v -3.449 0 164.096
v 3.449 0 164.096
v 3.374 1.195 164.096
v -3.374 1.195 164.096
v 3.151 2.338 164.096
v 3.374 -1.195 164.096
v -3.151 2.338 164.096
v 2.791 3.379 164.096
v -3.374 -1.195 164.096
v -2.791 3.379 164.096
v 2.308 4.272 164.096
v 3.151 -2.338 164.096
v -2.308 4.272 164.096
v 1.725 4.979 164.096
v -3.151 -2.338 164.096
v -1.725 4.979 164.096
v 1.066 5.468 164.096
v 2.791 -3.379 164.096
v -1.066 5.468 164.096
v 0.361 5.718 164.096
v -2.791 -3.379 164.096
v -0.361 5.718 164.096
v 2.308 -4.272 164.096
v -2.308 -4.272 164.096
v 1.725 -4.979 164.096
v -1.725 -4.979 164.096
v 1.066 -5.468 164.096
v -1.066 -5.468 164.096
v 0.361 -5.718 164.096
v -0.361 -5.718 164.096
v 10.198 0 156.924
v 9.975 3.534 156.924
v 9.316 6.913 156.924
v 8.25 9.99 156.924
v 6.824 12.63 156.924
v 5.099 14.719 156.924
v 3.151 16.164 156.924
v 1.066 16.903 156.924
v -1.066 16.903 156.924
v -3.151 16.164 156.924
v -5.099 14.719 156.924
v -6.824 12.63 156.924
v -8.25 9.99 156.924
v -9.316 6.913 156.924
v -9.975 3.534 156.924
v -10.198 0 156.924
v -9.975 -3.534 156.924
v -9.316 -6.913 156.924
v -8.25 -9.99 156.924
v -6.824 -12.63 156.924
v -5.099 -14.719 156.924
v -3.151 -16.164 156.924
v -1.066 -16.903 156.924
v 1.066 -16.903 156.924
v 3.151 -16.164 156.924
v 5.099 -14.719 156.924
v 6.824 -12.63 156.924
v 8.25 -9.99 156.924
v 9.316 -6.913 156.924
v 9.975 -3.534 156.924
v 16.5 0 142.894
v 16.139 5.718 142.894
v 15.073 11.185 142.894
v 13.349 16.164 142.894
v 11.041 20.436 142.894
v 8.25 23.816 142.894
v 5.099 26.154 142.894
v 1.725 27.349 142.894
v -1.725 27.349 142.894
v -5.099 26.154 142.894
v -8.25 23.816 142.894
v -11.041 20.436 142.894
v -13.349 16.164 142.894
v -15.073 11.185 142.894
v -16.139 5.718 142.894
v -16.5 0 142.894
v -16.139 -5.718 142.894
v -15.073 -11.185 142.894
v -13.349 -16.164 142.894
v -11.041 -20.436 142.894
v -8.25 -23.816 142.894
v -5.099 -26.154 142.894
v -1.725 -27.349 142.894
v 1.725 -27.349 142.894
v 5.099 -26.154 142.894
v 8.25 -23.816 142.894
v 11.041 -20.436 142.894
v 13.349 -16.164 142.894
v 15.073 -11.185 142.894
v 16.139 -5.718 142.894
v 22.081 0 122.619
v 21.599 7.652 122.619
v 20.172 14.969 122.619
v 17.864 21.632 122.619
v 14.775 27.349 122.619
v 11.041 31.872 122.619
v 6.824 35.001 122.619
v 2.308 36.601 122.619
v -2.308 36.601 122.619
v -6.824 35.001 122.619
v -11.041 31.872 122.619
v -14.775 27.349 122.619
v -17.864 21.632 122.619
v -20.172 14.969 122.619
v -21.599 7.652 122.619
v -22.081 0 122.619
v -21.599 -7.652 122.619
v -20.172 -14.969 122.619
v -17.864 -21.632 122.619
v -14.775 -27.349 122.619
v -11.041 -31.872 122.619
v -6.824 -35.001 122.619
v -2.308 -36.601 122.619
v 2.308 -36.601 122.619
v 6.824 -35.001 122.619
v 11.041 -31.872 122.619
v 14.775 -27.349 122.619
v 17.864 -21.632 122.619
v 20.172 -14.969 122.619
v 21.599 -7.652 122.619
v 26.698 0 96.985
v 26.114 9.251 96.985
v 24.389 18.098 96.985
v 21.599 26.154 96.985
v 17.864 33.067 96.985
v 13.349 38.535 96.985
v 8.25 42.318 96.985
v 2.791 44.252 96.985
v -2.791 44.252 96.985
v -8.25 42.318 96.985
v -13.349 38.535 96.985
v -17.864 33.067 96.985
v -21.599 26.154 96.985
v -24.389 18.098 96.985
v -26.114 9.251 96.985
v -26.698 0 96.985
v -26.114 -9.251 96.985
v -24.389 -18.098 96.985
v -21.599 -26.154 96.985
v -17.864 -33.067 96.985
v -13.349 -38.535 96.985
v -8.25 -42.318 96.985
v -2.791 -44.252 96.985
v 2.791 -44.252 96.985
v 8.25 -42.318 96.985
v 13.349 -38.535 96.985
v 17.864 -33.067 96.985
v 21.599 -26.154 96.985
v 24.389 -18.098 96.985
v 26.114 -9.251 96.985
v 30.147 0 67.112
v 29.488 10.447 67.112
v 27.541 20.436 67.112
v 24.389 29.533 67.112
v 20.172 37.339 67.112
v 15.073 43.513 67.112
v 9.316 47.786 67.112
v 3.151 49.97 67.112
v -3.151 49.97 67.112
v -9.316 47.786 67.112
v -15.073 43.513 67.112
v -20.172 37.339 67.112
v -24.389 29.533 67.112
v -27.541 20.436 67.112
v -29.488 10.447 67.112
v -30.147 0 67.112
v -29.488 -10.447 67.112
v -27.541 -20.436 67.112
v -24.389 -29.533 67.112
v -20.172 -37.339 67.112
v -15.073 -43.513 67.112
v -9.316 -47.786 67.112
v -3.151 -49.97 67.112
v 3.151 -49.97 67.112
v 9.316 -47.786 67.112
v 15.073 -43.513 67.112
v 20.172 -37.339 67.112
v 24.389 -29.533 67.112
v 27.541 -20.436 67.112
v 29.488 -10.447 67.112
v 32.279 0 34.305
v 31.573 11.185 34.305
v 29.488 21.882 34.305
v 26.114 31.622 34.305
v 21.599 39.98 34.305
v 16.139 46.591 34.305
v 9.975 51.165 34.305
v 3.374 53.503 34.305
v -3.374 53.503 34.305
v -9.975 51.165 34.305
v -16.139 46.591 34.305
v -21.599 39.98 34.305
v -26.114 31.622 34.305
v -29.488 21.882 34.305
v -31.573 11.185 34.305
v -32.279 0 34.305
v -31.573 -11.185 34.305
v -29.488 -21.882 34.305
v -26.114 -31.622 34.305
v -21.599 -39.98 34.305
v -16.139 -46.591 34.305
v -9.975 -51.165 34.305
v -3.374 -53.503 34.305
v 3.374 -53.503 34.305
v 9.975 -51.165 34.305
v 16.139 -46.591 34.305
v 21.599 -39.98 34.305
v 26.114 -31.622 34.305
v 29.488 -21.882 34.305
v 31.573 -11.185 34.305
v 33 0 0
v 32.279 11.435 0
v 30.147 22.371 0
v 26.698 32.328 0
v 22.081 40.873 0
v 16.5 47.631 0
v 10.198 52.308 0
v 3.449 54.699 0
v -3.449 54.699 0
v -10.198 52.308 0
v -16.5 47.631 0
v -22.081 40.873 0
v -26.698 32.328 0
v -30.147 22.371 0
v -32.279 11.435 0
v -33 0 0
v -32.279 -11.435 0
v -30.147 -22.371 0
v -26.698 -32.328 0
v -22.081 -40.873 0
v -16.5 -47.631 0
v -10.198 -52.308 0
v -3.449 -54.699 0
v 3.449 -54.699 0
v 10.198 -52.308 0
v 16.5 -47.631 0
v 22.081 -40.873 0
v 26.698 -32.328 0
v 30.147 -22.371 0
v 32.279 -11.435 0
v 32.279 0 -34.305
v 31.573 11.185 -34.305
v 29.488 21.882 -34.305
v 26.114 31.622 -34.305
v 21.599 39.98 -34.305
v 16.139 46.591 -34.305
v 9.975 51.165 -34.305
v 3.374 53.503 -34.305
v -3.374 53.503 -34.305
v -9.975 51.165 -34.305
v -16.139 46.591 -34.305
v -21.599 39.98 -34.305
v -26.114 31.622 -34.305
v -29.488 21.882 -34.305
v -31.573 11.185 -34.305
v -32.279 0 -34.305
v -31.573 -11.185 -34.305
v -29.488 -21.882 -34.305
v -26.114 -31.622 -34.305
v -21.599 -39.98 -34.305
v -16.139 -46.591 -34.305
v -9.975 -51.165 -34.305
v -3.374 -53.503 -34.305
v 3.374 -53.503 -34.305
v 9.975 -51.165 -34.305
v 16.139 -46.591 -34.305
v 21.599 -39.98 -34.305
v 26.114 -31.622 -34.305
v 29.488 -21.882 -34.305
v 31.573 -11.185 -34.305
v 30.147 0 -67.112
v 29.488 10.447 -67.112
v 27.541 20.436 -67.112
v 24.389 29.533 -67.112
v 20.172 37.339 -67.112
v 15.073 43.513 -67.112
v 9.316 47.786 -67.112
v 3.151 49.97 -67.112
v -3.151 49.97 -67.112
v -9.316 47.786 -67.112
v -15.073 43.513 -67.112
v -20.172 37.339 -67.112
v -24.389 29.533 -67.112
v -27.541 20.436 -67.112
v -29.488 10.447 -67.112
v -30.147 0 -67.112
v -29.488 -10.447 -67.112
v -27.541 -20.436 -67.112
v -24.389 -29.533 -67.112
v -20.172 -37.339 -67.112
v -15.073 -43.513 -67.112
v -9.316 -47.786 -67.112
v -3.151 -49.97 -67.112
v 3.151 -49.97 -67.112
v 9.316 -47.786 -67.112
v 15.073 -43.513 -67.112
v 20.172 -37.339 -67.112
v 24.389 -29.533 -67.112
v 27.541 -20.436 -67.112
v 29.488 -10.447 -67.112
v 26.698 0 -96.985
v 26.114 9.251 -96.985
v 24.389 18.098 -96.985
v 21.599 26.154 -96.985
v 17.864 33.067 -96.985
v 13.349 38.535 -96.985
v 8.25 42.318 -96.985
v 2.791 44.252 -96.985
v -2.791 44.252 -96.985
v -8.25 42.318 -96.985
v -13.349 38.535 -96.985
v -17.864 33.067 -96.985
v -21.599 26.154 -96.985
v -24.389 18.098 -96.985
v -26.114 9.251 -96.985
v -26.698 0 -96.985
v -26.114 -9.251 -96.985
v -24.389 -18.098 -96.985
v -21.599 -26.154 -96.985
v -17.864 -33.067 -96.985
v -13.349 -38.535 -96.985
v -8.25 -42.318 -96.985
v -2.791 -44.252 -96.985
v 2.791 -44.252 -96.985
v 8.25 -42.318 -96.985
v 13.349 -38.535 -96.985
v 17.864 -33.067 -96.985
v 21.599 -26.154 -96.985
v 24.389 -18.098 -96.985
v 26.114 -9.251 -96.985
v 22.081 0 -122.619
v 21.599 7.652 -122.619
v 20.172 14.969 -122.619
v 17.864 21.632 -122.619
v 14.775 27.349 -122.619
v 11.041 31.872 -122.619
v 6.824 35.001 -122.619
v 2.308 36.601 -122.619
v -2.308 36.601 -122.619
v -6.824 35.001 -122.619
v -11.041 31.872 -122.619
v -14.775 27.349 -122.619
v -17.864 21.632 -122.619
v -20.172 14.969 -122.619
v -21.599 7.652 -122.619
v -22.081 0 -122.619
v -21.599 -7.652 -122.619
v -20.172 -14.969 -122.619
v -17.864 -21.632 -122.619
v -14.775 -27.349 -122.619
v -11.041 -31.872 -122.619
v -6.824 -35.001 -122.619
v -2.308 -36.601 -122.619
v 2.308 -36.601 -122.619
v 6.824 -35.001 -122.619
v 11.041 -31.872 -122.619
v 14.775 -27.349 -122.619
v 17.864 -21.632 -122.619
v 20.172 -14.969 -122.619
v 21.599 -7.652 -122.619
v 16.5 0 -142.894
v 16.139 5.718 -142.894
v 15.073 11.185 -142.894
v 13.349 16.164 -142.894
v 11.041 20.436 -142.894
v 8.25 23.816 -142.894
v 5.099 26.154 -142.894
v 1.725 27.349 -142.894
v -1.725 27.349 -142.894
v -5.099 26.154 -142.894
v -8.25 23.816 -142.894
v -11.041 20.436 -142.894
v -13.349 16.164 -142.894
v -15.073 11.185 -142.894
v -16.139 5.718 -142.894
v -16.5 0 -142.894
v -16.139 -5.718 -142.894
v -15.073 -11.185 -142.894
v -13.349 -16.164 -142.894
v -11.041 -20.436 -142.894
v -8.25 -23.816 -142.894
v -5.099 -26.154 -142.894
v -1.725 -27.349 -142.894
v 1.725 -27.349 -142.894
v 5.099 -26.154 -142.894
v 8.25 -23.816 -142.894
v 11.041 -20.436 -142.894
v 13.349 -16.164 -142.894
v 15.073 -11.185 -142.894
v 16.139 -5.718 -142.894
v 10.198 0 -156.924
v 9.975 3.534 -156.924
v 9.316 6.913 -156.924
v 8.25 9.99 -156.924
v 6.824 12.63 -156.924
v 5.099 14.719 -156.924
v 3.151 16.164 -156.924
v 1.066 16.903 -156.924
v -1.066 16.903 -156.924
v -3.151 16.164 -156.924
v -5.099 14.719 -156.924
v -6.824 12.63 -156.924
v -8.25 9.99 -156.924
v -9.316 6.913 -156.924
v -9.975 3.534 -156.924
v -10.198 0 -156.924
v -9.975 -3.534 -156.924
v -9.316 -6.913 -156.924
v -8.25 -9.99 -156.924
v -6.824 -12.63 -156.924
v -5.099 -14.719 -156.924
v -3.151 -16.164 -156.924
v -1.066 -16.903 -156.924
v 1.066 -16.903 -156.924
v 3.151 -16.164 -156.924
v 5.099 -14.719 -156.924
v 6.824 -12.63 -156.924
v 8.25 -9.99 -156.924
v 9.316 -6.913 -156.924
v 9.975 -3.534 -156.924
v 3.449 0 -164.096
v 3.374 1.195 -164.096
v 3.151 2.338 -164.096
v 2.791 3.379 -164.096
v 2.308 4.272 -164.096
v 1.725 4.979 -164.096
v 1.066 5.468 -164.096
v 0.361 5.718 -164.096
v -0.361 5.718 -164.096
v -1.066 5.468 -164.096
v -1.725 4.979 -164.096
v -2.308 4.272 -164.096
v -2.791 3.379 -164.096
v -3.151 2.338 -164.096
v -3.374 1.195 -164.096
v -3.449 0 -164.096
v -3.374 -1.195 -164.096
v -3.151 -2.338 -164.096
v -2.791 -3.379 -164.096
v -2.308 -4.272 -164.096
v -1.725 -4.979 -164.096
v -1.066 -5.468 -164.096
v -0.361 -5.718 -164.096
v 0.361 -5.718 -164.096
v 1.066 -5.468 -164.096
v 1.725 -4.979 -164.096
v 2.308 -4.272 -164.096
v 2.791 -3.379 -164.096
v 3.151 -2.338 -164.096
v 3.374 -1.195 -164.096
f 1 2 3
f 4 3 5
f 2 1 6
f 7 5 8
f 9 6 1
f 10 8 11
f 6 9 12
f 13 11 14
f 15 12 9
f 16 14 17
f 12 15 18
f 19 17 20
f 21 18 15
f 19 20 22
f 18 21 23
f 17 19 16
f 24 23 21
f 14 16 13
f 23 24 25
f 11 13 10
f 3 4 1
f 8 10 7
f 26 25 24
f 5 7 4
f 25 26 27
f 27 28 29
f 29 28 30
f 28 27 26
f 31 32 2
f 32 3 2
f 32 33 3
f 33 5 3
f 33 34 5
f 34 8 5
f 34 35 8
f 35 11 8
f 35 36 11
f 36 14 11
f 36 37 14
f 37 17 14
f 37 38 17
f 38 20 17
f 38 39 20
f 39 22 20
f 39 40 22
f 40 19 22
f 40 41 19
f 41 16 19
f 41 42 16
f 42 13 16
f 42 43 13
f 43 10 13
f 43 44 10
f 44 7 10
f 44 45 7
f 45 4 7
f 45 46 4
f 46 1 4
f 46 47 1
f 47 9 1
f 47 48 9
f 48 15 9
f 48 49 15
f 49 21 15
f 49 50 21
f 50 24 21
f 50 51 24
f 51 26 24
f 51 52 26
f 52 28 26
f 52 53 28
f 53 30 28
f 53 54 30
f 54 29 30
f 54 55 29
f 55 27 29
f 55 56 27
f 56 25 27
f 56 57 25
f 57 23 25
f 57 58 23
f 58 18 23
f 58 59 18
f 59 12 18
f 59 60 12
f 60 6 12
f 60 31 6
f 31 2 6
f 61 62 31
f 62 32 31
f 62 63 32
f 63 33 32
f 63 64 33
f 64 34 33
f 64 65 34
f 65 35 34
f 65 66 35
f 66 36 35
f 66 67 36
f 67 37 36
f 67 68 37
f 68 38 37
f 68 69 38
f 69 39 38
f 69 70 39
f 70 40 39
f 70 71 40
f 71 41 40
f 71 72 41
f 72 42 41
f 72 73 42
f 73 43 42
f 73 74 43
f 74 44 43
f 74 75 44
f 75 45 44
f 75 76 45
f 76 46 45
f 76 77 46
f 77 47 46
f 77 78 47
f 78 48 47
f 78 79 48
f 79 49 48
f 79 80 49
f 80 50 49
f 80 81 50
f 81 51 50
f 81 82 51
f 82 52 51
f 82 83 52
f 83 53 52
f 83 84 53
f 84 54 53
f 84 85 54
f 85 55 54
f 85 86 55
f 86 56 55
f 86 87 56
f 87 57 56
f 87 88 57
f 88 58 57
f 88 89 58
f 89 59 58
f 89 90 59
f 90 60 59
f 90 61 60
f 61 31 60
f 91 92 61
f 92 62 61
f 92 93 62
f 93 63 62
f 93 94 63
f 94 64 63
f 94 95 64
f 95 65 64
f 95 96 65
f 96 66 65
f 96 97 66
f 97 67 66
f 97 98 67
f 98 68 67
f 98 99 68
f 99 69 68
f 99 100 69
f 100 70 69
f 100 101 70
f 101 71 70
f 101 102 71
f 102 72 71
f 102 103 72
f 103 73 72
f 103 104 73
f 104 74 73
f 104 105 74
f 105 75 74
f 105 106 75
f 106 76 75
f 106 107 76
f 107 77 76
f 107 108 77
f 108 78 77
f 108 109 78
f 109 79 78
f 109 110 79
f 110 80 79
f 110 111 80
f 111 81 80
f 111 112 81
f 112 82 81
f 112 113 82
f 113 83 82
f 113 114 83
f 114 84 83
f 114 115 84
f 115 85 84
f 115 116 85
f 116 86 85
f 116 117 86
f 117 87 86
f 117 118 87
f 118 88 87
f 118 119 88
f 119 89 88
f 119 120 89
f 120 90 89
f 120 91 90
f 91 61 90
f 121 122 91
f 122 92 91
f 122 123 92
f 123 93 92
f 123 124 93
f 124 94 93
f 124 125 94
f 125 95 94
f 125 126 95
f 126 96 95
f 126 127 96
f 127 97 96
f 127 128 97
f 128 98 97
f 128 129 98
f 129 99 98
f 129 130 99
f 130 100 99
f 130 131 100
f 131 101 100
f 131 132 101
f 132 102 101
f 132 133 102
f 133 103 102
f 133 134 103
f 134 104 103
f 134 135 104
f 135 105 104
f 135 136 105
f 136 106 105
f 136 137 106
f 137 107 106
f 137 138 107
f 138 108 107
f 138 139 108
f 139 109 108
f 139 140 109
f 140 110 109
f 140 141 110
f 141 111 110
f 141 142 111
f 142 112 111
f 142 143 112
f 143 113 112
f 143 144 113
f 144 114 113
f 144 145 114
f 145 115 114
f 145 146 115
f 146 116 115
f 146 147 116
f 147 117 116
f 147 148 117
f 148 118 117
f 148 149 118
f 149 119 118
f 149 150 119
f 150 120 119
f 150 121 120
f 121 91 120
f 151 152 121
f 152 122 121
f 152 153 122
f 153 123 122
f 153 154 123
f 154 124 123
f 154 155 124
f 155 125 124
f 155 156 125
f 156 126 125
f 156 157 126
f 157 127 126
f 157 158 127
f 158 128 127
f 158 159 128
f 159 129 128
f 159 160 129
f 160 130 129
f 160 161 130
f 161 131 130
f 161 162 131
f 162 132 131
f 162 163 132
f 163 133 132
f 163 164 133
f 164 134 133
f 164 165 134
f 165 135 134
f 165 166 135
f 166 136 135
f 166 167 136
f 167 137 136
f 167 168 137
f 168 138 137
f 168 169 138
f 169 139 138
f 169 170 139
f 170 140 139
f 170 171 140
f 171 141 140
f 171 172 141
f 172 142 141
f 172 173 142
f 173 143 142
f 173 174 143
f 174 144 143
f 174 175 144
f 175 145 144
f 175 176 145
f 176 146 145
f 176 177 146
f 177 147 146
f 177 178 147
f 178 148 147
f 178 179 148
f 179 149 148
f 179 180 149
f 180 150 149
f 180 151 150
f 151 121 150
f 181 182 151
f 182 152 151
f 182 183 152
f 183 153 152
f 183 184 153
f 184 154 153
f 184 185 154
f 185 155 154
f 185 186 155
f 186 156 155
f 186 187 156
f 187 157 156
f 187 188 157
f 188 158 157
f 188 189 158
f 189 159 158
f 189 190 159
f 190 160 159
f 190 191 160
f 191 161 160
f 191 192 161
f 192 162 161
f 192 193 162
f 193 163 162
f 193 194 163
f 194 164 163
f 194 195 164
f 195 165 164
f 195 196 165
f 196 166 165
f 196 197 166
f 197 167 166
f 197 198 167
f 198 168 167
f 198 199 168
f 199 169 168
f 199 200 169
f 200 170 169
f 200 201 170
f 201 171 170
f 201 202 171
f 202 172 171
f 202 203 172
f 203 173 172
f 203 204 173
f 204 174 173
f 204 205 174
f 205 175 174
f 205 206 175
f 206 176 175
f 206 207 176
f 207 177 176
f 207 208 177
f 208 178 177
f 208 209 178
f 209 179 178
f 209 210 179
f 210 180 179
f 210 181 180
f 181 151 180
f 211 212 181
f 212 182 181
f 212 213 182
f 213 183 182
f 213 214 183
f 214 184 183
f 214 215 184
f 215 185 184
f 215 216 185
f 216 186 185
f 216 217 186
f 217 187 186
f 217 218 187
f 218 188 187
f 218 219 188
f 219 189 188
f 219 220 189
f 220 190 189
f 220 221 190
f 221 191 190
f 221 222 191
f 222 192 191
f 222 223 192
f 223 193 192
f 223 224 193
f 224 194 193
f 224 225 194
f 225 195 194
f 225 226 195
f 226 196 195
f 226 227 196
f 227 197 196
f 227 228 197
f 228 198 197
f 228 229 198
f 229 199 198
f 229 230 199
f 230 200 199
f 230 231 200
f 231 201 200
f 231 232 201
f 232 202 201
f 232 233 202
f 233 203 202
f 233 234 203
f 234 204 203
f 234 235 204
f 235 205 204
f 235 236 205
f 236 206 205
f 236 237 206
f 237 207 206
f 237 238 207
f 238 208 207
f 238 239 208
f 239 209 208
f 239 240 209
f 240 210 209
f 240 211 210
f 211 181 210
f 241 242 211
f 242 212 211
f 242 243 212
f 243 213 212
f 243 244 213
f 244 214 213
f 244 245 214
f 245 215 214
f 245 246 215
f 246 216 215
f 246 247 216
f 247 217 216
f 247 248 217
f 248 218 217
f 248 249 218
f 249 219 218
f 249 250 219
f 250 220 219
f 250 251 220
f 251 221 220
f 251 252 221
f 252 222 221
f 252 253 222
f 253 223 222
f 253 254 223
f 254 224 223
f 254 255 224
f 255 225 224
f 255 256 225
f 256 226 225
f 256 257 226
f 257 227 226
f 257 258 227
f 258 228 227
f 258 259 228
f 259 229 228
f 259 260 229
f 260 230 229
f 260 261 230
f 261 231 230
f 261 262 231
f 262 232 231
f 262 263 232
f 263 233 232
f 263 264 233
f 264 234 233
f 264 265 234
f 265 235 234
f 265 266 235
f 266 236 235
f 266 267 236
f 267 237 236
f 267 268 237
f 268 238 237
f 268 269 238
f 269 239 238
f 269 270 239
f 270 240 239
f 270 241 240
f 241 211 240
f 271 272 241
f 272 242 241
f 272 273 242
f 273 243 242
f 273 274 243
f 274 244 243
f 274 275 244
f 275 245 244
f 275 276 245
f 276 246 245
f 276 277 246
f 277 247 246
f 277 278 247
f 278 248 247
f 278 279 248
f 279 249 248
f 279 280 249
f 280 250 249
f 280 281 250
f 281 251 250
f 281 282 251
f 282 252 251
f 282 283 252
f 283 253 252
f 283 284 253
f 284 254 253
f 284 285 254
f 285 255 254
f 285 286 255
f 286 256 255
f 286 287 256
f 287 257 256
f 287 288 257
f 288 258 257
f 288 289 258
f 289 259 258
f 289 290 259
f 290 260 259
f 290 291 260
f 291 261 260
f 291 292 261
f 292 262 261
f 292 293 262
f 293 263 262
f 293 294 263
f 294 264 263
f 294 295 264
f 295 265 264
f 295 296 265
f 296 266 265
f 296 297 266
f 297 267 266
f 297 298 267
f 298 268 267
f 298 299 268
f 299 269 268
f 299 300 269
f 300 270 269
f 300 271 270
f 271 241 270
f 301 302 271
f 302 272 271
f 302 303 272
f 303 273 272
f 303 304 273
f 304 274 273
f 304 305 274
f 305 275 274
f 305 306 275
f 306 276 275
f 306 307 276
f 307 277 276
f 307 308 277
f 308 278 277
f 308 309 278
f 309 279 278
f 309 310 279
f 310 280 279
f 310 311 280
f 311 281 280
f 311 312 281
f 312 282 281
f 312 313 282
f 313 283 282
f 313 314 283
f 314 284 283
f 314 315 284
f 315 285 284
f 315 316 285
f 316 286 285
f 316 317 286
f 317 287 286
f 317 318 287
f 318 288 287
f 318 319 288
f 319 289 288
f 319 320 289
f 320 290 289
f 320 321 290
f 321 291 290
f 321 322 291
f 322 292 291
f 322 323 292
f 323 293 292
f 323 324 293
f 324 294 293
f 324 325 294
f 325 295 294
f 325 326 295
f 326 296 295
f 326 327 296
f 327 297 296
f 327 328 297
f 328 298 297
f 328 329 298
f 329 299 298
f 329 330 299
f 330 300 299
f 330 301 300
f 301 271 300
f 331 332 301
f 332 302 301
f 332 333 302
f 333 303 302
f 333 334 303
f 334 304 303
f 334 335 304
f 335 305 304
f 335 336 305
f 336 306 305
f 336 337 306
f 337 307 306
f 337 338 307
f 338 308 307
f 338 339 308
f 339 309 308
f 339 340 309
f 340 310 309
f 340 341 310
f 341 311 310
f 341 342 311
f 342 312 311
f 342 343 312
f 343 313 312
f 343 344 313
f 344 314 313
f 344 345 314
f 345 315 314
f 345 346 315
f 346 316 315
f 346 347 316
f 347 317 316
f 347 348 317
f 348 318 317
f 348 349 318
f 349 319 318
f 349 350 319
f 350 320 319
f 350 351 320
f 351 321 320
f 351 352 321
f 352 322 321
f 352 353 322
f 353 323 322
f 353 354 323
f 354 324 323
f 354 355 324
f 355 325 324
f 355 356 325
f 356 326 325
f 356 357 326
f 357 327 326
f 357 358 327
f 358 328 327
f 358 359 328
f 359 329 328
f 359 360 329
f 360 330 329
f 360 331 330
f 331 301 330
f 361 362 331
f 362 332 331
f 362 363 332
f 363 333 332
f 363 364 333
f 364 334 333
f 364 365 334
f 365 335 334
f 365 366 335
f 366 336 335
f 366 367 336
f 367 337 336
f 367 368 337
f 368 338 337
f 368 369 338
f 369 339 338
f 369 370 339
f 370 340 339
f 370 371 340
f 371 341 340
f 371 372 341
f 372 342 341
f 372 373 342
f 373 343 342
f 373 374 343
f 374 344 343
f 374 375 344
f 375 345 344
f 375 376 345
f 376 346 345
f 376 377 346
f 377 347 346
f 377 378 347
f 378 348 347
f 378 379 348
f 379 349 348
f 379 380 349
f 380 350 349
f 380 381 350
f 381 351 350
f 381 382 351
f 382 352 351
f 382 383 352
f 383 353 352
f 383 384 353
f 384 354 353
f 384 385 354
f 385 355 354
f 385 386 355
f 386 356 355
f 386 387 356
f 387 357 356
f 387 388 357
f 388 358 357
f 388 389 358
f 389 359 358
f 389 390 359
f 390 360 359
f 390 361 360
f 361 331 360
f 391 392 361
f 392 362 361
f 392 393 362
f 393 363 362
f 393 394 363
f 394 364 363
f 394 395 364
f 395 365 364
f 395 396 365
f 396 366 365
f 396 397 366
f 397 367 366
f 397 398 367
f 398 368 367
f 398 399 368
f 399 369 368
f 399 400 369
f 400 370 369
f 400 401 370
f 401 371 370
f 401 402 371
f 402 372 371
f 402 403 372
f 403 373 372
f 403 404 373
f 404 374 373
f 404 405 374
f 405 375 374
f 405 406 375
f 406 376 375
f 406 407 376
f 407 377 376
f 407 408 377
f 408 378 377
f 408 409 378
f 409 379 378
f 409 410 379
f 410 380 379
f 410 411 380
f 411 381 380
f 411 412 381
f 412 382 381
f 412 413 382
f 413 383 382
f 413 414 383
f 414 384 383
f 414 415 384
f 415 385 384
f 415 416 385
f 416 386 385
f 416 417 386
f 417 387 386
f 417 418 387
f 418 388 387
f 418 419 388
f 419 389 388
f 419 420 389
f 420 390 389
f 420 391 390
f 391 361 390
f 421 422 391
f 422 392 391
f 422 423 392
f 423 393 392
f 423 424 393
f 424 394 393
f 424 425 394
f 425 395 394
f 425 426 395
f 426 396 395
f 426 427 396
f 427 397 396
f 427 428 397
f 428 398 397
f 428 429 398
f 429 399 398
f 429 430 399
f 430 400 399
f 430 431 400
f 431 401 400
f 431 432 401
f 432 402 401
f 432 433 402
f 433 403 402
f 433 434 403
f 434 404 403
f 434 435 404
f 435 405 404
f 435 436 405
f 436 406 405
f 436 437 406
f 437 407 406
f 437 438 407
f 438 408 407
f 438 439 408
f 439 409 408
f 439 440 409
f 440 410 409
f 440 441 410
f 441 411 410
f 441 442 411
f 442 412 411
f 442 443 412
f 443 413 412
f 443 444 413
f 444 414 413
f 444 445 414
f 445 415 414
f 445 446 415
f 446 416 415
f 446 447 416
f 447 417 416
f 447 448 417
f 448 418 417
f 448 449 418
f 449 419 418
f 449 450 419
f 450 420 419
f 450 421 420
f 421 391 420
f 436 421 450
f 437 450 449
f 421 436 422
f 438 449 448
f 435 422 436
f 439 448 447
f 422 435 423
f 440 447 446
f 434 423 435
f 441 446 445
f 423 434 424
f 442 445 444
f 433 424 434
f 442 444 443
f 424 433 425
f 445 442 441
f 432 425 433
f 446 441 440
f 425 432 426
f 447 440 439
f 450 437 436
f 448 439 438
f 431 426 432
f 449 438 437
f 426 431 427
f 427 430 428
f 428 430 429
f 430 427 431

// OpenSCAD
// Generated by SolidPython 1.0.1 on 2020-07-29 00:46:45


scale(v = [3, 5, 15]) {
	sphere(r = 11);
}
/***********************************************
*********      SolidPython code:      **********
************************************************
 
# import packages: SolidPython
from solid import *
from solid.utils import *
from itertools import chain, combinations, permutations


class Resize:

    def __init__(self, scad_file):
        self.scad_file = scad_file
        #self.scad_file = import_scad(scad_file)
        # cone/cylinder param:
        self.r1 = 0
        self.r2 = 0
        self.h = 0
        # rectangular prism param:
        self.w = 0
        self.l = 0
        # ellipse param:
        self.r = 0

    # import OpenScad code (file name corresponds to shape)


    # classify shape + parameters
    def assign(self, param1, param2, param3):
        if self.scad_file == 'cone.scad':
            self.r1 = param1
            self.r2 = param2
            self.h = param3
        elif self.scad_file == 'cylinder.scad':
            self.r1 = param1
            self.r2 = param2
            self.h = param3
        elif self.scad_file == 'rectangularPrism.scad':
            self.h = param1
            self.l = param2
            self.w = param3
        else:
            self.r = param1
            self.h = param2

    # resize parameters
    def iterate(self):
        x = range(3, 20, 2)
        i = 1
        if self.scad_file == 'cone.scad':
            tempList = list(permutations(x, 2))
            for temp in tempList:
                param1 = temp[0]
                param2 = temp[1]
                filepath = 'produced_scad_files/' + 'cone' + str(param1) + '_' + str(param2) + '_' + '.scad'
                scad_render_to_file(cylinder(h=param1, r1=param2, r2=0), filepath)

        elif self.scad_file == 'cylinder.scad':
            tempList = list(permutations(x, 3))
            for temp in tempList:
                param1 = temp[0]
                param2 = temp[1]
                filepath = 'produced_scad_files/' + 'cylinder' + str(param1) + '_' + str(param2) + '_' + '.scad'
                scad_render_to_file(cylinder(h=param1, r1=param2, r2=param2), filepath)

        elif self.scad_file == 'rectangularPrism.scad':
            tempList = list(permutations(x, 3))
            for temp in tempList:
                param1 = temp[0]
                param2 = temp[1]
                param3 = temp[2]
                filepath = 'produced_scad_files/' + 'rectangularPrism' + str(param1) + '_' + str(param2) + '_' + str(
                    param3) + '.scad'
                scad_render_to_file(cube(size=(param1, param2, param3)), filepath)

        elif self.scad_file == 'ellipse.scad':
            tempList = list(permutations(x, 4))
            for temp in tempList:
                param1 = temp[0]
                param2 = temp[1]
                param3 = temp[2]
                param4 = temp[3]
                filepath = 'produced_scad_files/' + 'ellipse' + str(param1) + '_' + str(param2) + '_' + str(param3) + '_' + str(param4) + '.scad'
                scad_render_to_file(scale([param1, param2, param3])(sphere(r=param4)), filepath)

    def render_to_scadfile(self):
        scad_render_to_file(scad, 'example.scad') 
 
************************************************/
